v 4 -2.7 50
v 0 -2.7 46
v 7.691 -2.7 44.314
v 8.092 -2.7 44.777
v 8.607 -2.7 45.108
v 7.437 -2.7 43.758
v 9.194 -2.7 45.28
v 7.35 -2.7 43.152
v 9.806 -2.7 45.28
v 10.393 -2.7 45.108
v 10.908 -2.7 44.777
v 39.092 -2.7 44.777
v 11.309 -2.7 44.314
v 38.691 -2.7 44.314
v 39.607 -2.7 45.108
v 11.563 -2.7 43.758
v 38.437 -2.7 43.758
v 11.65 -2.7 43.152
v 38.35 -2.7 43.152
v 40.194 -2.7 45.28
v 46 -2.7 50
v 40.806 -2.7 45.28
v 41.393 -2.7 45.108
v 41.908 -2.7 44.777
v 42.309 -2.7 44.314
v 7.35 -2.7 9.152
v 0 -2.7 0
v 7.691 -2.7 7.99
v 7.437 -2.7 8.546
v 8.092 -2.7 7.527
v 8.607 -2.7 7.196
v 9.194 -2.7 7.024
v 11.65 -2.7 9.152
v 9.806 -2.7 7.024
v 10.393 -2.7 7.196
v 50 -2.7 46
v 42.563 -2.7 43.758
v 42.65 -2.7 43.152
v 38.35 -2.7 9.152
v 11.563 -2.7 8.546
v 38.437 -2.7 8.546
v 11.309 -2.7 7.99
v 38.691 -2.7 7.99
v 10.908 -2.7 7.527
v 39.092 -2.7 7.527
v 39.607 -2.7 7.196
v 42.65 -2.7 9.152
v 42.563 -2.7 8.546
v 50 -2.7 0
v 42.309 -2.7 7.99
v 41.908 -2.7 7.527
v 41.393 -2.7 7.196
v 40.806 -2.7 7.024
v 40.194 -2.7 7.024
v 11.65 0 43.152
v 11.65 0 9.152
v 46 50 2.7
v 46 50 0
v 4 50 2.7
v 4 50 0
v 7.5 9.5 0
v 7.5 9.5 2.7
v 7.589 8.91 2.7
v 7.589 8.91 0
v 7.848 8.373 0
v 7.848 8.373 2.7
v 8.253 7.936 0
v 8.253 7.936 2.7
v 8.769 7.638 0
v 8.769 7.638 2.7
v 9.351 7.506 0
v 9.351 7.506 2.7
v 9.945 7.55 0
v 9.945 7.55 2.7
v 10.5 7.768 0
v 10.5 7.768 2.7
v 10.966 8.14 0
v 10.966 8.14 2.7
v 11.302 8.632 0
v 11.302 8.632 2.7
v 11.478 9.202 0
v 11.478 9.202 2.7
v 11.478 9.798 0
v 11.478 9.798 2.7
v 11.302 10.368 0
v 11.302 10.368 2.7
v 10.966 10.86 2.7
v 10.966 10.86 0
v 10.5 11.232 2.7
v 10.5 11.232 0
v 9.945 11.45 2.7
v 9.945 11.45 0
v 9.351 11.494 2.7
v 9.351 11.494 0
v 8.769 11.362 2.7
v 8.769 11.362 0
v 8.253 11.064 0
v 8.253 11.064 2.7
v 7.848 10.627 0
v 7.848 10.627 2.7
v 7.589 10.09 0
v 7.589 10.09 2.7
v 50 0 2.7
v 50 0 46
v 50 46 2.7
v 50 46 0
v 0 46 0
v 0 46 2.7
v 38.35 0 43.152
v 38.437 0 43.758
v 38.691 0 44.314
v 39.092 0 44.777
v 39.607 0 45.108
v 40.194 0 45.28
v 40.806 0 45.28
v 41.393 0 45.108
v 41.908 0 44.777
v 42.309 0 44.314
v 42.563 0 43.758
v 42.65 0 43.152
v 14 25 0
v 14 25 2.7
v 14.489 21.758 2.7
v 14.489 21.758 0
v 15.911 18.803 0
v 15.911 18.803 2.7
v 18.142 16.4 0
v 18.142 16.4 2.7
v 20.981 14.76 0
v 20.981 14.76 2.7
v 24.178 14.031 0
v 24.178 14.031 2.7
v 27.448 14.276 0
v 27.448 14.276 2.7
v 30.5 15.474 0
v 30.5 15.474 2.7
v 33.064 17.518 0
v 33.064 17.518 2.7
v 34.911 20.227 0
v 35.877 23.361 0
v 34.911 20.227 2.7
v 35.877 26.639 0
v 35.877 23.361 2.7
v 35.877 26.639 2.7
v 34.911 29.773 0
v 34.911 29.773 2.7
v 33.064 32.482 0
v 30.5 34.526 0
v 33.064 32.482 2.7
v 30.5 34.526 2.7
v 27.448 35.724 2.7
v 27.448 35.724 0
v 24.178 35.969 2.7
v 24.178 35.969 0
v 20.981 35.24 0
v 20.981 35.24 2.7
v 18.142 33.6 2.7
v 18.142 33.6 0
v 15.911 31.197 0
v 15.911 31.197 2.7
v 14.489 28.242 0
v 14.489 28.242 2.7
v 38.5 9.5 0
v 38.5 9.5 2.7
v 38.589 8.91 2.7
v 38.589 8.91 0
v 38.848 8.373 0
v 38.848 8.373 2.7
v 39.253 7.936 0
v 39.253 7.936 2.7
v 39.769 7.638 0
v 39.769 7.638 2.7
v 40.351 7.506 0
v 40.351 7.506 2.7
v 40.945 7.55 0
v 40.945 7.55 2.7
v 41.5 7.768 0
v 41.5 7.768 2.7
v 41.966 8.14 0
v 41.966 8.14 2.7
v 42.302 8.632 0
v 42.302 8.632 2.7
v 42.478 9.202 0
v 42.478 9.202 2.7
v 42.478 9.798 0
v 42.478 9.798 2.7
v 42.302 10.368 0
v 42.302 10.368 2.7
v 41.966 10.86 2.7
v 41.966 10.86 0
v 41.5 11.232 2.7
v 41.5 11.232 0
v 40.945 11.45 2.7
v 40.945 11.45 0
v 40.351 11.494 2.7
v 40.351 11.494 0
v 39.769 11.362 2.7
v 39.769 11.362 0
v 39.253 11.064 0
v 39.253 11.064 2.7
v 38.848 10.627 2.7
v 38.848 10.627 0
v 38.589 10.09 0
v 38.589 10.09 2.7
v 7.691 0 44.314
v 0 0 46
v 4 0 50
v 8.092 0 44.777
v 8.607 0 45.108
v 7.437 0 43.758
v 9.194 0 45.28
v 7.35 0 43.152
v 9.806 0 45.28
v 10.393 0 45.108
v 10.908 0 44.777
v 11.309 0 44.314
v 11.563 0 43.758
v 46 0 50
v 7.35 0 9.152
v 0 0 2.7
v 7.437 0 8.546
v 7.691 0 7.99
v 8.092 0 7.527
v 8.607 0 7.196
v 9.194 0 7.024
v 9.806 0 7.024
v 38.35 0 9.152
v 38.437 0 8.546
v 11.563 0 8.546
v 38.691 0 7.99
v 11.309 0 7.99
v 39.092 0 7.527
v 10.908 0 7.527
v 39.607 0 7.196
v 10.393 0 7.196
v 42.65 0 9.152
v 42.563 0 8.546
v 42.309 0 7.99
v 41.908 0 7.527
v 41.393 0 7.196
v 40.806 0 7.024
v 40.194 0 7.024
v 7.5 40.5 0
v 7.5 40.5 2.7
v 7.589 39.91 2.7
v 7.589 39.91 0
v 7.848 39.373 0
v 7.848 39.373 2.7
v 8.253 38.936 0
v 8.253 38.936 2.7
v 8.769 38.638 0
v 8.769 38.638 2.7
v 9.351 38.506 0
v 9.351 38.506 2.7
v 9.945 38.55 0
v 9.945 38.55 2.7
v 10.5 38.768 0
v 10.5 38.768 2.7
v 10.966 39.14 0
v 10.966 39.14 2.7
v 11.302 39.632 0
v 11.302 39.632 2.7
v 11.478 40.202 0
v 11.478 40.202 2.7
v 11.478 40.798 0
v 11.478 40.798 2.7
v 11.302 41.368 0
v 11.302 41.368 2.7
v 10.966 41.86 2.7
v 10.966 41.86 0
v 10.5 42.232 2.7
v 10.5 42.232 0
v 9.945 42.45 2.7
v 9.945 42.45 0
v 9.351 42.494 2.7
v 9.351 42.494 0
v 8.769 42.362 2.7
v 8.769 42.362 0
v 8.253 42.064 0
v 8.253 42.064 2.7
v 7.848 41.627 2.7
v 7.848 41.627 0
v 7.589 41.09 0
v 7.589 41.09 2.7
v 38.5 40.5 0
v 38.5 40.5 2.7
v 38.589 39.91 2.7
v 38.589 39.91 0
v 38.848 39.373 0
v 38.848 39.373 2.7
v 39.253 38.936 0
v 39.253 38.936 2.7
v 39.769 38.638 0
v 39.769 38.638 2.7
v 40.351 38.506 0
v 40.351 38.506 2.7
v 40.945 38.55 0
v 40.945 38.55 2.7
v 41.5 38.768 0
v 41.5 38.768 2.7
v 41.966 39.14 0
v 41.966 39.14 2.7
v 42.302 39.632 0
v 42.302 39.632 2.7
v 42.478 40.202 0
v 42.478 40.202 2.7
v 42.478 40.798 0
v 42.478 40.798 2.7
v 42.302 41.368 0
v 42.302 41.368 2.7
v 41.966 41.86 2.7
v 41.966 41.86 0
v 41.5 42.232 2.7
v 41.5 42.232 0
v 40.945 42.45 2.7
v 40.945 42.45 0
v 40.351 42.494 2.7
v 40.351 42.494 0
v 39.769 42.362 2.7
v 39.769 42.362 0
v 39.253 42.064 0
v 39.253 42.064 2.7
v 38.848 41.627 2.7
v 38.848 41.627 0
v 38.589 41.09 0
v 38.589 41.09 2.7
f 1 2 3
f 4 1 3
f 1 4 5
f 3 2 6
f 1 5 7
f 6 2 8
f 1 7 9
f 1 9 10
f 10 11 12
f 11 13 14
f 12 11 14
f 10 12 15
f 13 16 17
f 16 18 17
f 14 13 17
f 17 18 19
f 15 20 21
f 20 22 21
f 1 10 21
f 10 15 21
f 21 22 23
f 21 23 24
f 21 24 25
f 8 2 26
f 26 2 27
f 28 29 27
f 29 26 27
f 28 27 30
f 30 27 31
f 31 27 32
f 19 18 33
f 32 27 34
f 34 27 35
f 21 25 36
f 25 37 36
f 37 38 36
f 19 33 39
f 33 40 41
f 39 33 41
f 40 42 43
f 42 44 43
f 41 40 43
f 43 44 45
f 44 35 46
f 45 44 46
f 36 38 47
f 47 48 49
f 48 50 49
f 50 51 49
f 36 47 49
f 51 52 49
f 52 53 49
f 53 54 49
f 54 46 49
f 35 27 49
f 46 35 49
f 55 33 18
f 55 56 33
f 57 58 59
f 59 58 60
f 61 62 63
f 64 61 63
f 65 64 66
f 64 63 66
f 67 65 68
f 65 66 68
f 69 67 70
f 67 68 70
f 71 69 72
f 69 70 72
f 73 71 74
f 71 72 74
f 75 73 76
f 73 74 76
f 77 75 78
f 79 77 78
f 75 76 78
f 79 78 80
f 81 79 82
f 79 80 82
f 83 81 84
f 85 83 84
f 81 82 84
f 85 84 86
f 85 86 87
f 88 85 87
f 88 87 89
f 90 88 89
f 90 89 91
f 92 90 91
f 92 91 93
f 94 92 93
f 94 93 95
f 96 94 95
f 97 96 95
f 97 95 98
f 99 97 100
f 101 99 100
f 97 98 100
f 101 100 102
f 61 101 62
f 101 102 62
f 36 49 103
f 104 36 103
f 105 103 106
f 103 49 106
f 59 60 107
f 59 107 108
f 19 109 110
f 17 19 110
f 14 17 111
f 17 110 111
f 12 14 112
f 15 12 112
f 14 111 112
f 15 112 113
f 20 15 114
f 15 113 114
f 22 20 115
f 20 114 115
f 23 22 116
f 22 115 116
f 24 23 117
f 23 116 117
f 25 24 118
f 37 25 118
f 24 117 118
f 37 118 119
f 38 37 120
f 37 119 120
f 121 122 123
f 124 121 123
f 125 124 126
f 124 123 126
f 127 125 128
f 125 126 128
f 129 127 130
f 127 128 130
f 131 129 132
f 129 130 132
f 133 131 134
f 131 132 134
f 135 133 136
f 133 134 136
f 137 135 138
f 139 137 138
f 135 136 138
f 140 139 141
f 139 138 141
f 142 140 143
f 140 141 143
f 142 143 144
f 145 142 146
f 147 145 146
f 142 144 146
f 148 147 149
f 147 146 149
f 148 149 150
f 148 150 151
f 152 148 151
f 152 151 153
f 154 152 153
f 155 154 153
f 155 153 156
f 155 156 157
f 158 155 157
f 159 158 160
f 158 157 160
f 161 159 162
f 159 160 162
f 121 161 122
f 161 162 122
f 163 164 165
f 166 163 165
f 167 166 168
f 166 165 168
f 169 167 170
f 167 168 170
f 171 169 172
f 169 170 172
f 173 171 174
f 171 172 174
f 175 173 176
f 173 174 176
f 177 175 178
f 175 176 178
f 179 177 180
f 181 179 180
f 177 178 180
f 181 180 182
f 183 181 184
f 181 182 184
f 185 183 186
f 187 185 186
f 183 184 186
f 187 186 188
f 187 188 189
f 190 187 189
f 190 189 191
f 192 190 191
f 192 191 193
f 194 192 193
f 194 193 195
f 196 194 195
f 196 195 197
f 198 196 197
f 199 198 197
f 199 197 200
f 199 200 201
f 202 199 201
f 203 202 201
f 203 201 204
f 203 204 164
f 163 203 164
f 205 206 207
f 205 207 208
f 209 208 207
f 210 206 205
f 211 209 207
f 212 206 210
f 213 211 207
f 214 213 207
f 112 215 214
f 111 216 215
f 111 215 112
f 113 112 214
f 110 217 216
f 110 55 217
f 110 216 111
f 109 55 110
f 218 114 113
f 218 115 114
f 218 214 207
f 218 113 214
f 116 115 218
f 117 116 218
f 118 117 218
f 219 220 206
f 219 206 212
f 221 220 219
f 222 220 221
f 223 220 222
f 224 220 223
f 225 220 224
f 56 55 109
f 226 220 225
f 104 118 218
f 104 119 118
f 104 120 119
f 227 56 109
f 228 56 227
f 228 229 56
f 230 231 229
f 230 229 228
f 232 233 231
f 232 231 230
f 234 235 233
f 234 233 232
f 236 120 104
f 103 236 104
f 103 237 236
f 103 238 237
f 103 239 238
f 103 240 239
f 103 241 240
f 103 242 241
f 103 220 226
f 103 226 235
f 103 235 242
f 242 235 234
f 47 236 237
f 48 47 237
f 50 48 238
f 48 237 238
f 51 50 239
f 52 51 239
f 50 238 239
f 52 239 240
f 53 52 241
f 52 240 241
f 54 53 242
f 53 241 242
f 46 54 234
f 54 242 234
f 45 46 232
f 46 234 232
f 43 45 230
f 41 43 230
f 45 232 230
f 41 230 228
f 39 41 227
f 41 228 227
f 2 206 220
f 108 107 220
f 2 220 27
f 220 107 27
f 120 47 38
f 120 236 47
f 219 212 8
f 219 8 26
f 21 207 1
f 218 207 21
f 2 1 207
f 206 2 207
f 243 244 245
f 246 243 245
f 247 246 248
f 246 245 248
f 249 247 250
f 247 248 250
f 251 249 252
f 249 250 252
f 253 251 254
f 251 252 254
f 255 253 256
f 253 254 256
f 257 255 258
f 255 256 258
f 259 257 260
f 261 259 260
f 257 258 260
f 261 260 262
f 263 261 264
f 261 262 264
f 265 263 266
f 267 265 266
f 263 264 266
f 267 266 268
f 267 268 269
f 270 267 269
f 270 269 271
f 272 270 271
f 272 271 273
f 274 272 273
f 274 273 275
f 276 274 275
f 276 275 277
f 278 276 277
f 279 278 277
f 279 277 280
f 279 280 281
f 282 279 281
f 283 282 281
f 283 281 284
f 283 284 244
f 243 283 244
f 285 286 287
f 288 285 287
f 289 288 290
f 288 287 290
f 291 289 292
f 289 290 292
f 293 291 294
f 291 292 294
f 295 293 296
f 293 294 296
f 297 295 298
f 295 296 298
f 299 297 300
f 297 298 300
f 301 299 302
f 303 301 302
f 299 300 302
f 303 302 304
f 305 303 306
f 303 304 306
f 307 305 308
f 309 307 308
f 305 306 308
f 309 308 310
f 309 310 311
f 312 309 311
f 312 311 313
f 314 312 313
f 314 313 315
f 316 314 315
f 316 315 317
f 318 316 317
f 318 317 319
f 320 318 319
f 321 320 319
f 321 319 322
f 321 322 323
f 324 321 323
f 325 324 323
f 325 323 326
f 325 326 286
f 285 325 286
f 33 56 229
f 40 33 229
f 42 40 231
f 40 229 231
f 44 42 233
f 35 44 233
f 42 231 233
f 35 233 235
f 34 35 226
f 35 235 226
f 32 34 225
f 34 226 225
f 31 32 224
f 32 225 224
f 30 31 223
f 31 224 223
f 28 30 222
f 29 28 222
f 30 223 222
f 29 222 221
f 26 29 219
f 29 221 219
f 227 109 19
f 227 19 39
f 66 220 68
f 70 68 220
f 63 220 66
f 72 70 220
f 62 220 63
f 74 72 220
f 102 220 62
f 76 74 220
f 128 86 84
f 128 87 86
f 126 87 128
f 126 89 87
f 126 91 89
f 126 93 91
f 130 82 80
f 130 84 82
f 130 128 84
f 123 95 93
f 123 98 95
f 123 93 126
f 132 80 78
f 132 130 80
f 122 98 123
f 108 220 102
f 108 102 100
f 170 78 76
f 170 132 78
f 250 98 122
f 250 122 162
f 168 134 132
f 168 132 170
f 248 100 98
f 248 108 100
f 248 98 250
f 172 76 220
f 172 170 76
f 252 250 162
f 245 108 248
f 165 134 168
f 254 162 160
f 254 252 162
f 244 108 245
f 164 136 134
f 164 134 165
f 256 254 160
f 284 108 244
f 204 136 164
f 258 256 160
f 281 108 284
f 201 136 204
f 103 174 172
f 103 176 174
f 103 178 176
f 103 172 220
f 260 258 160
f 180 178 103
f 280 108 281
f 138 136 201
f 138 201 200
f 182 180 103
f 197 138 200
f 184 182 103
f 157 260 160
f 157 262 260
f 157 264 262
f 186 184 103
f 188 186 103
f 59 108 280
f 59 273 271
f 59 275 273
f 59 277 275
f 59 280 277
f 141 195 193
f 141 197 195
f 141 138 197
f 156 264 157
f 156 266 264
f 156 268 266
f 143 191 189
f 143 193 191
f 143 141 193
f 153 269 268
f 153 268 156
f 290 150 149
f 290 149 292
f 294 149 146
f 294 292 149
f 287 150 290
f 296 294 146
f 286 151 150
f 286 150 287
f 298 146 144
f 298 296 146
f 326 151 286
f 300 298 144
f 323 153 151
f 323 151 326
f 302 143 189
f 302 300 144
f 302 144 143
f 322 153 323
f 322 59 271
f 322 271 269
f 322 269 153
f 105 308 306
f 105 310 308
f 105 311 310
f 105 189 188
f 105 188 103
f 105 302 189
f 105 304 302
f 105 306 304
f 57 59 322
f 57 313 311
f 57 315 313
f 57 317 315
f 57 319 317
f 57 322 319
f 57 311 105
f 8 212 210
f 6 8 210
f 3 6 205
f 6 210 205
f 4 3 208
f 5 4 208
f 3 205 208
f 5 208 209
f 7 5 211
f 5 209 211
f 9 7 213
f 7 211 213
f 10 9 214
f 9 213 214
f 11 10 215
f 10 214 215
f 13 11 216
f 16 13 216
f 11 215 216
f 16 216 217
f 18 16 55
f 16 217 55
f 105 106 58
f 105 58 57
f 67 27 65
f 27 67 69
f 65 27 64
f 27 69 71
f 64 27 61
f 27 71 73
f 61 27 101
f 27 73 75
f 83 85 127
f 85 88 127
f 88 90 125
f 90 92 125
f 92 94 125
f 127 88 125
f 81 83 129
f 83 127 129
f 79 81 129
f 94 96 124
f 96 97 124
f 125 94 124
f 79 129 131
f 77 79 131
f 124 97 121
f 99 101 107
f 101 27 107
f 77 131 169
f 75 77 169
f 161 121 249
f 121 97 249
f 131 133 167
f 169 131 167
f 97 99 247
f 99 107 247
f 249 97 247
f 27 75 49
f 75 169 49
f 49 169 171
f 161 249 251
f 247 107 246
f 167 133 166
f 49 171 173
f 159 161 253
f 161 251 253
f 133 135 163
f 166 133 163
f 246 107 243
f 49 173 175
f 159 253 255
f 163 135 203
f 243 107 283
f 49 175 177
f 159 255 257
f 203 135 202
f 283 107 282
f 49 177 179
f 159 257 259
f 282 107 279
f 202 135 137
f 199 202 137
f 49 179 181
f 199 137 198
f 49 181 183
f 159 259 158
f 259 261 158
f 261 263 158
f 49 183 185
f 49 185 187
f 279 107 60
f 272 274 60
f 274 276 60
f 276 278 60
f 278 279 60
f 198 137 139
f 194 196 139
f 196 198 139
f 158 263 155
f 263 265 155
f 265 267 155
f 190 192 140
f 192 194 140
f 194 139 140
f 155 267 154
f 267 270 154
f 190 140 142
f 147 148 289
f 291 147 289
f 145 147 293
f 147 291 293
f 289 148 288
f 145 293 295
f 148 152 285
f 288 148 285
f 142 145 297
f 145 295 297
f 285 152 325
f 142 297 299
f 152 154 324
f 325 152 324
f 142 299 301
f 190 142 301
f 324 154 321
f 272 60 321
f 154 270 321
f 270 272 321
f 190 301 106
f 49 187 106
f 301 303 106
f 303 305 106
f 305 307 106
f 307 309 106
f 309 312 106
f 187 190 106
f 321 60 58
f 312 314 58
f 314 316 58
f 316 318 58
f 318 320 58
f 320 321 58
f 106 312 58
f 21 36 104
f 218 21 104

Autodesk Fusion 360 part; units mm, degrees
sketch "Esquisse1" plane through (0, 0, 0) normal (0, 0, 1) x (1, 0, 0)
  line L0 (0, 0) -> (50, 0)
  line L1 (50, 0) -> (50, 50)
  line L2 (50, 50) -> (0, 50)
  line L3 (0, 50) -> (0, 0)
  dimension "d1" = 50
  dimension "d2" = 50
extrude "Extrusion1" add sketch "Esquisse1" along normal blind 2.7
sketch "Esquisse2" plane through (0, 0, 0) normal (0, 1, 0) x (1, 0, 0)
  line L0 (0, -50) -> (50, -50)
  line L1 (50, -50) -> (50, 0)
  line L2 (50, 0) -> (0, 0)
  line L3 (0, 0) -> (0, -50)
extrude "Extrusion2" add sketch "Esquisse2" against normal blind 2.7
sketch "Esquisse3" plane through (0, 0, 2.7) normal (0, 0, 1) x (-1, 0, 0)
  line L0 (0, -50) -> (0, 0)
  line L1 (0, 0) -> (-50, 0)
  line L2 (-50, 0) -> (-50, -50)
  line L3 (-50, -50) -> (0, -50)
  circle A0 centre (-25, -25) radius 11
  dimension "d7" = 22
extrude "Extrusion3" cut sketch "Esquisse3" against normal blind 10 contours A0
sketch "Esquisse4" plane through (0, 0, 2.7) normal (0, 0, 1) x (-1, 0, 0)
  circle A0 centre (-25, -25) radius 11
  line L0 (0, -50) -> (0, 0)
  line L1 (0, 0) -> (-50, 0)
  line L2 (-50, 0) -> (-50, -50)
  line L3 (-50, -50) -> (0, -50)
  circle A1 centre (-9.5, -40.5) radius 2
  dimension "d10" = 4
  dimension "d11" = 15.5
  dimension "d12" = 15.5
extrude "Extrusion4" cut sketch "Esquisse4" against normal blind 10 contours A1
pattern_linear "Réseau R1" count 2 spacing 31 along (1, 0, 0) count 2 spacing 31 along (0, -1, 0) of "Extrusion4"
sketch "Esquisse5" plane through (0, 0, 0) normal (0, 1, 0) x (-1, 0, 0)
  line L0 (-50, 2.7) -> (0, 2.7)
  line L1 (0, 2.7) -> (0, 50)
  line L2 (0, 50) -> (-50, 50)
  line L3 (-50, 50) -> (-50, 2.7)
  line L4 (-42.65, 9.1521) -> (-42.65, 43.1521)
  arc A0 (-38.35, 43.1521) -> (-42.65, 43.1521) centre (-40.5, 43.1521) ccw
  line L5 (-38.35, 43.1521) -> (-38.35, 9.1521)
  arc A1 (-42.65, 9.1521) -> (-38.35, 9.1521) centre (-40.5, 9.1521) ccw
  dimension "d19" = 4.3
  dimension "d20" = 34
  dimension "d22" = 9.5
extrude "Extrusion5" cut sketch "Esquisse5" against normal blind 6 contours L4 A0 L5 A1
pattern_linear "Réseau R2" count 2 spacing 31 along (-1, 0, 0) of "Extrusion5"
chamfer "Chanfrein1" distance 4 angle 45 4 edges at (50, -1.35, 50) (0, -1.35, 50) (50, 50, 1.35) (0, 50, 1.35)
equation "d11 = ( 31 / 2 ) * 1 mm"
equation "d12 = ( 31 / 2 ) * 1 mm"
